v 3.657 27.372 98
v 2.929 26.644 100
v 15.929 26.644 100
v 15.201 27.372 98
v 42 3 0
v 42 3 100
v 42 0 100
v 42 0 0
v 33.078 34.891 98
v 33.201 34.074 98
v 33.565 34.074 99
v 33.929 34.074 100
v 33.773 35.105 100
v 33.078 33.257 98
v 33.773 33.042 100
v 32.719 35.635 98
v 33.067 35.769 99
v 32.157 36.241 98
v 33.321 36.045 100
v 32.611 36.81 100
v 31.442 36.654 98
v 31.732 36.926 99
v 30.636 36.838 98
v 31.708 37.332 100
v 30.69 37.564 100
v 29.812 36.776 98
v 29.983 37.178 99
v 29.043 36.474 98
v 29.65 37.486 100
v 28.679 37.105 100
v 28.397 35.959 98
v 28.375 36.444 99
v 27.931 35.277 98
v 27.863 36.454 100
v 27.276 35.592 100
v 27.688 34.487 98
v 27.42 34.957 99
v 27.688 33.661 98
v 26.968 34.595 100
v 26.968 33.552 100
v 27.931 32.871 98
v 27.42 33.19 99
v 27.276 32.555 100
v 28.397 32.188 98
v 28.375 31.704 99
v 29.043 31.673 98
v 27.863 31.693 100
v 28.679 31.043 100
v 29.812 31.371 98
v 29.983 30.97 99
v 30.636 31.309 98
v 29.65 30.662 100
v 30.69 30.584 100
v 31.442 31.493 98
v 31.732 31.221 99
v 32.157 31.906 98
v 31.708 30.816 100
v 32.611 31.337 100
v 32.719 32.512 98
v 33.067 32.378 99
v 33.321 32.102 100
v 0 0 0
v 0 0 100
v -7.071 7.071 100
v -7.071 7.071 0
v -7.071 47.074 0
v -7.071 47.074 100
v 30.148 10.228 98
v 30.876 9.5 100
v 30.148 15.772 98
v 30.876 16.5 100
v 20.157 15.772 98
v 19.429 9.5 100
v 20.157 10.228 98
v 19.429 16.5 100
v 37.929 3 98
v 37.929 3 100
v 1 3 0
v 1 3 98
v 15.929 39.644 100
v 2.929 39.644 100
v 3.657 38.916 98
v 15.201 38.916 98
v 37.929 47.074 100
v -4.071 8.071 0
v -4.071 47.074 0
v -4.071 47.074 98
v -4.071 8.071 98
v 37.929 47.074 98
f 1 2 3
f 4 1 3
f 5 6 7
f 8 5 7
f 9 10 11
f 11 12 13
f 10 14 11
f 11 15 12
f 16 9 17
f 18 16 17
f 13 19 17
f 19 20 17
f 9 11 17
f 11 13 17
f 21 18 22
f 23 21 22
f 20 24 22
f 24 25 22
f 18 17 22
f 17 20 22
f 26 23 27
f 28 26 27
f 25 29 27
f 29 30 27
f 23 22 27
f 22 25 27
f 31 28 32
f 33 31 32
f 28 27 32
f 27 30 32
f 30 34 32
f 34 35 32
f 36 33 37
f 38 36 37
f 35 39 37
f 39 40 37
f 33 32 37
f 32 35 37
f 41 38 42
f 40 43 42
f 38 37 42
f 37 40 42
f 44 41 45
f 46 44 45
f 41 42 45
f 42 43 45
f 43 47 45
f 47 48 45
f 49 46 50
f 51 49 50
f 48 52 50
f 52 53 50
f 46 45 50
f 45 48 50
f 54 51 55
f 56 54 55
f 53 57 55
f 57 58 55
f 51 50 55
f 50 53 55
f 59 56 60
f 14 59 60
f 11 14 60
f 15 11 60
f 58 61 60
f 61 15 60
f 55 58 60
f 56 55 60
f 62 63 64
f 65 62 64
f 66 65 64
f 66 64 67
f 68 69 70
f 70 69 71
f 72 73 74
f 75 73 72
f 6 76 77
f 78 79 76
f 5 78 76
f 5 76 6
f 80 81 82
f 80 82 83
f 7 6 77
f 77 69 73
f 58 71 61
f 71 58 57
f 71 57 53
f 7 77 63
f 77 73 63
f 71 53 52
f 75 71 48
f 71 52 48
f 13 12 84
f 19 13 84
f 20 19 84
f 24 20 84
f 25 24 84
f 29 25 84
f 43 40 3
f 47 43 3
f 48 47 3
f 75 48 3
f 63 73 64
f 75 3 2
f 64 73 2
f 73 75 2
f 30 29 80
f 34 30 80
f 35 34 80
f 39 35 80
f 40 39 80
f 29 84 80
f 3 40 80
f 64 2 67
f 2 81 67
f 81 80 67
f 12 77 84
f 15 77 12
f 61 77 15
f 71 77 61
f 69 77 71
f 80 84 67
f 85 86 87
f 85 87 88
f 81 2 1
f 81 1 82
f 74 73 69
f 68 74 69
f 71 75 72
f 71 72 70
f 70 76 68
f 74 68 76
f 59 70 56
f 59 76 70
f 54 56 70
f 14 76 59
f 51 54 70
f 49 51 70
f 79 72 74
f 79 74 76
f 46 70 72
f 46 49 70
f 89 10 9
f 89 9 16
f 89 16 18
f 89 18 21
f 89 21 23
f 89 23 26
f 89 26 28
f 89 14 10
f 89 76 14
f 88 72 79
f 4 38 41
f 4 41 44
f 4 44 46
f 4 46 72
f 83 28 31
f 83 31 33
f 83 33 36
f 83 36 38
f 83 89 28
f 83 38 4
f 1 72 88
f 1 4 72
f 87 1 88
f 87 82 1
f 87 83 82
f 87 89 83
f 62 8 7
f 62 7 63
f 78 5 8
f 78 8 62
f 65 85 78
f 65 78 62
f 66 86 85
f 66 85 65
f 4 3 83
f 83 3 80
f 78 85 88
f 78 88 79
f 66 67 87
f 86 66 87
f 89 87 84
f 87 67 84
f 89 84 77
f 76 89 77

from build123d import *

# Parameters (mm, degrees)
BOSS_EXTRUDE1_DEPTH          = 100
BOSS_EXTRUDE2_DEPTH          = 2
CUT_EXTRUDE2_REACH           = 120.237
SKETCH4_R                    = 2.75
CUT_EXTRUDE3_REACH           = 120.237
SKETCH5_W                    = 9
SKETCH5_H                    = 4
CUT_EXTRUDE4_REACH           = 120.237
SKETCH6_W                    = 10
SKETCH6_H                    = 10
SKETCH7_R                    = 3.5
CUT_EXTRUDE6_DEPTH           = 2
CUT_EXTRUDE6_DRAFT           = -20
SKETCH7_W                    = 11.447026043
SKETCH7_H                    = 7
CUT_EXTRUDE6_PROFILE_2_DEPTH = 2
CUT_EXTRUDE6_PROFILE_2_DRAFT = -20
SKETCH7_W_2                  = 13
SKETCH7_H_2                  = 13
CUT_EXTRUDE6_PROFILE_3_DEPTH = 2
CUT_EXTRUDE6_PROFILE_3_DRAFT = -20


with BuildPart() as part:
    # Sketch2 → Boss-Extrude1 (new body)
    with BuildSketch(Plane.XY):
        Polygon((-7.071067812, 47.073759399), (-4.071067812, 47.073759399), (-4.071067812, 8.071067812), (1, 3), (42, 3), (42, 0), (0, 0), (-7.071067812, 7.071067812), align=None)
    extrude(amount=BOSS_EXTRUDE1_DEPTH)

    # Sketch3 → Boss-Extrude2 (add)
    with BuildSketch(Plane.XY.offset(100)):
        Polygon((-4.071067812, 47.073759399), (37.928932188, 47.073759399), (37.928932188, 3), (1, 3), (-4.071067812, 8.071067812), align=None)
    extrude(amount=-BOSS_EXTRUDE2_DEPTH)

    # Sketch4 → Cut-Extrude2 (cut, up to next)
    with BuildSketch(Plane.XY.offset(100), mode=Mode.PRIVATE) as cut_extrude2_sk1:
        with Locations((30.428932188, 34.073759399)):
            Circle(SKETCH4_R)
    cut_extrude2_tool1 = extrude(cut_extrude2_sk1.sketch, amount=-CUT_EXTRUDE2_REACH, mode=Mode.PRIVATE) & part.part
    add(cut_extrude2_tool1.solids().sort_by_distance((30.428932, 34.073759, 100))[0], mode=Mode.SUBTRACT)

    # Sketch5 → Cut-Extrude3 (cut, up to next)
    with BuildSketch(Plane.XY.offset(100), mode=Mode.PRIVATE) as cut_extrude3_sk1:
        with Locations((25.428932188, 13)):
            Rectangle(SKETCH5_W, SKETCH5_H)
    cut_extrude3_tool1 = extrude(cut_extrude3_sk1.sketch, amount=-CUT_EXTRUDE3_REACH, mode=Mode.PRIVATE) & part.part
    add(cut_extrude3_tool1.solids().sort_by_distance((25.428932, 13, 100))[0], mode=Mode.SUBTRACT)

    # Sketch6 → Cut-Extrude4 (cut, up to next)
    with BuildSketch(Plane.XY.offset(100), mode=Mode.PRIVATE) as cut_extrude4_sk1:
        with Locations((9.428932188, 33.144002223)):
            Rectangle(SKETCH6_W, SKETCH6_H)
    cut_extrude4_tool1 = extrude(cut_extrude4_sk1.sketch, amount=-CUT_EXTRUDE4_REACH, mode=Mode.PRIVATE) & part.part
    add(cut_extrude4_tool1.solids().sort_by_distance((9.428932, 33.144002, 100))[0], mode=Mode.SUBTRACT)


with BuildPart() as cut_extrude6_tool:
    # Sketch7 → Cut-Extrude6 (with draft: the straight prism first)
    with BuildSketch(Plane.XY.offset(100)):
        with Locations((30.428932188, 34.073759399)):
            Circle(SKETCH7_R)
    extrude(amount=-CUT_EXTRUDE6_DEPTH)
    # Cut-Extrude6: the draft: its side faces are tilted about the plane it starts from
    cut_extrude6_sides = [cut_extrude6_tool.faces().sort_by_distance(p)[0] for p in [
        (26.928932188, 34.073759399, 99),
    ]]
    draft(cut_extrude6_sides, Plane.XY.offset(100), CUT_EXTRUDE6_DRAFT)


with BuildPart() as part_1:
    add(part.part)

    # Cut-Extrude6: cut by cut_extrude6_tool
    add(cut_extrude6_tool.part, mode=Mode.SUBTRACT)


with BuildPart() as cut_extrude6_profile_2_tool:
    # Sketch7 → Cut-Extrude6 profile 2 (with draft: the straight prism first)
    with BuildSketch(Plane.XY.offset(100)):
        with Locations((25.15244521, 13)):
            Rectangle(SKETCH7_W, SKETCH7_H)
    extrude(amount=-CUT_EXTRUDE6_PROFILE_2_DEPTH)
    # Cut-Extrude6 profile 2: the draft: its side faces are tilted about the plane it starts from
    cut_extrude6_profile_2_sides = [cut_extrude6_profile_2_tool.faces().sort_by_distance(p)[0] for p in [
        (19.428932188, 13, 99),
        (25.15244521, 9.5, 99),
        (30.875958231, 13, 99),
        (25.15244521, 16.5, 99),
    ]]
    draft(cut_extrude6_profile_2_sides, Plane.XY.offset(100), CUT_EXTRUDE6_PROFILE_2_DRAFT)


with BuildPart() as part_2:
    add(part_1.part)

    # Cut-Extrude6 profile 2: cut by cut_extrude6_profile_2_tool
    add(cut_extrude6_profile_2_tool.part, mode=Mode.SUBTRACT)


with BuildPart() as cut_extrude6_profile_3_tool:
    # Sketch7 → Cut-Extrude6 profile 3 (with draft: the straight prism first)
    with BuildSketch(Plane.XY.offset(100)):
        with Locations((9.428932188, 33.144002223)):
            Rectangle(SKETCH7_W_2, SKETCH7_H_2)
    extrude(amount=-CUT_EXTRUDE6_PROFILE_3_DEPTH)
    # Cut-Extrude6 profile 3: the draft: its side faces are tilted about the plane it starts from
    cut_extrude6_profile_3_sides = [cut_extrude6_profile_3_tool.faces().sort_by_distance(p)[0] for p in [
        (2.928932188, 33.144002223, 99),
        (9.428932188, 26.644002223, 99),
        (15.928932188, 33.144002223, 99),
        (9.428932188, 39.644002223, 99),
    ]]
    draft(cut_extrude6_profile_3_sides, Plane.XY.offset(100), CUT_EXTRUDE6_PROFILE_3_DRAFT)


with BuildPart() as part_3:
    add(part_2.part)

    # Cut-Extrude6 profile 3: cut by cut_extrude6_profile_3_tool
    add(cut_extrude6_profile_3_tool.part, mode=Mode.SUBTRACT)


solid = part_3.part
